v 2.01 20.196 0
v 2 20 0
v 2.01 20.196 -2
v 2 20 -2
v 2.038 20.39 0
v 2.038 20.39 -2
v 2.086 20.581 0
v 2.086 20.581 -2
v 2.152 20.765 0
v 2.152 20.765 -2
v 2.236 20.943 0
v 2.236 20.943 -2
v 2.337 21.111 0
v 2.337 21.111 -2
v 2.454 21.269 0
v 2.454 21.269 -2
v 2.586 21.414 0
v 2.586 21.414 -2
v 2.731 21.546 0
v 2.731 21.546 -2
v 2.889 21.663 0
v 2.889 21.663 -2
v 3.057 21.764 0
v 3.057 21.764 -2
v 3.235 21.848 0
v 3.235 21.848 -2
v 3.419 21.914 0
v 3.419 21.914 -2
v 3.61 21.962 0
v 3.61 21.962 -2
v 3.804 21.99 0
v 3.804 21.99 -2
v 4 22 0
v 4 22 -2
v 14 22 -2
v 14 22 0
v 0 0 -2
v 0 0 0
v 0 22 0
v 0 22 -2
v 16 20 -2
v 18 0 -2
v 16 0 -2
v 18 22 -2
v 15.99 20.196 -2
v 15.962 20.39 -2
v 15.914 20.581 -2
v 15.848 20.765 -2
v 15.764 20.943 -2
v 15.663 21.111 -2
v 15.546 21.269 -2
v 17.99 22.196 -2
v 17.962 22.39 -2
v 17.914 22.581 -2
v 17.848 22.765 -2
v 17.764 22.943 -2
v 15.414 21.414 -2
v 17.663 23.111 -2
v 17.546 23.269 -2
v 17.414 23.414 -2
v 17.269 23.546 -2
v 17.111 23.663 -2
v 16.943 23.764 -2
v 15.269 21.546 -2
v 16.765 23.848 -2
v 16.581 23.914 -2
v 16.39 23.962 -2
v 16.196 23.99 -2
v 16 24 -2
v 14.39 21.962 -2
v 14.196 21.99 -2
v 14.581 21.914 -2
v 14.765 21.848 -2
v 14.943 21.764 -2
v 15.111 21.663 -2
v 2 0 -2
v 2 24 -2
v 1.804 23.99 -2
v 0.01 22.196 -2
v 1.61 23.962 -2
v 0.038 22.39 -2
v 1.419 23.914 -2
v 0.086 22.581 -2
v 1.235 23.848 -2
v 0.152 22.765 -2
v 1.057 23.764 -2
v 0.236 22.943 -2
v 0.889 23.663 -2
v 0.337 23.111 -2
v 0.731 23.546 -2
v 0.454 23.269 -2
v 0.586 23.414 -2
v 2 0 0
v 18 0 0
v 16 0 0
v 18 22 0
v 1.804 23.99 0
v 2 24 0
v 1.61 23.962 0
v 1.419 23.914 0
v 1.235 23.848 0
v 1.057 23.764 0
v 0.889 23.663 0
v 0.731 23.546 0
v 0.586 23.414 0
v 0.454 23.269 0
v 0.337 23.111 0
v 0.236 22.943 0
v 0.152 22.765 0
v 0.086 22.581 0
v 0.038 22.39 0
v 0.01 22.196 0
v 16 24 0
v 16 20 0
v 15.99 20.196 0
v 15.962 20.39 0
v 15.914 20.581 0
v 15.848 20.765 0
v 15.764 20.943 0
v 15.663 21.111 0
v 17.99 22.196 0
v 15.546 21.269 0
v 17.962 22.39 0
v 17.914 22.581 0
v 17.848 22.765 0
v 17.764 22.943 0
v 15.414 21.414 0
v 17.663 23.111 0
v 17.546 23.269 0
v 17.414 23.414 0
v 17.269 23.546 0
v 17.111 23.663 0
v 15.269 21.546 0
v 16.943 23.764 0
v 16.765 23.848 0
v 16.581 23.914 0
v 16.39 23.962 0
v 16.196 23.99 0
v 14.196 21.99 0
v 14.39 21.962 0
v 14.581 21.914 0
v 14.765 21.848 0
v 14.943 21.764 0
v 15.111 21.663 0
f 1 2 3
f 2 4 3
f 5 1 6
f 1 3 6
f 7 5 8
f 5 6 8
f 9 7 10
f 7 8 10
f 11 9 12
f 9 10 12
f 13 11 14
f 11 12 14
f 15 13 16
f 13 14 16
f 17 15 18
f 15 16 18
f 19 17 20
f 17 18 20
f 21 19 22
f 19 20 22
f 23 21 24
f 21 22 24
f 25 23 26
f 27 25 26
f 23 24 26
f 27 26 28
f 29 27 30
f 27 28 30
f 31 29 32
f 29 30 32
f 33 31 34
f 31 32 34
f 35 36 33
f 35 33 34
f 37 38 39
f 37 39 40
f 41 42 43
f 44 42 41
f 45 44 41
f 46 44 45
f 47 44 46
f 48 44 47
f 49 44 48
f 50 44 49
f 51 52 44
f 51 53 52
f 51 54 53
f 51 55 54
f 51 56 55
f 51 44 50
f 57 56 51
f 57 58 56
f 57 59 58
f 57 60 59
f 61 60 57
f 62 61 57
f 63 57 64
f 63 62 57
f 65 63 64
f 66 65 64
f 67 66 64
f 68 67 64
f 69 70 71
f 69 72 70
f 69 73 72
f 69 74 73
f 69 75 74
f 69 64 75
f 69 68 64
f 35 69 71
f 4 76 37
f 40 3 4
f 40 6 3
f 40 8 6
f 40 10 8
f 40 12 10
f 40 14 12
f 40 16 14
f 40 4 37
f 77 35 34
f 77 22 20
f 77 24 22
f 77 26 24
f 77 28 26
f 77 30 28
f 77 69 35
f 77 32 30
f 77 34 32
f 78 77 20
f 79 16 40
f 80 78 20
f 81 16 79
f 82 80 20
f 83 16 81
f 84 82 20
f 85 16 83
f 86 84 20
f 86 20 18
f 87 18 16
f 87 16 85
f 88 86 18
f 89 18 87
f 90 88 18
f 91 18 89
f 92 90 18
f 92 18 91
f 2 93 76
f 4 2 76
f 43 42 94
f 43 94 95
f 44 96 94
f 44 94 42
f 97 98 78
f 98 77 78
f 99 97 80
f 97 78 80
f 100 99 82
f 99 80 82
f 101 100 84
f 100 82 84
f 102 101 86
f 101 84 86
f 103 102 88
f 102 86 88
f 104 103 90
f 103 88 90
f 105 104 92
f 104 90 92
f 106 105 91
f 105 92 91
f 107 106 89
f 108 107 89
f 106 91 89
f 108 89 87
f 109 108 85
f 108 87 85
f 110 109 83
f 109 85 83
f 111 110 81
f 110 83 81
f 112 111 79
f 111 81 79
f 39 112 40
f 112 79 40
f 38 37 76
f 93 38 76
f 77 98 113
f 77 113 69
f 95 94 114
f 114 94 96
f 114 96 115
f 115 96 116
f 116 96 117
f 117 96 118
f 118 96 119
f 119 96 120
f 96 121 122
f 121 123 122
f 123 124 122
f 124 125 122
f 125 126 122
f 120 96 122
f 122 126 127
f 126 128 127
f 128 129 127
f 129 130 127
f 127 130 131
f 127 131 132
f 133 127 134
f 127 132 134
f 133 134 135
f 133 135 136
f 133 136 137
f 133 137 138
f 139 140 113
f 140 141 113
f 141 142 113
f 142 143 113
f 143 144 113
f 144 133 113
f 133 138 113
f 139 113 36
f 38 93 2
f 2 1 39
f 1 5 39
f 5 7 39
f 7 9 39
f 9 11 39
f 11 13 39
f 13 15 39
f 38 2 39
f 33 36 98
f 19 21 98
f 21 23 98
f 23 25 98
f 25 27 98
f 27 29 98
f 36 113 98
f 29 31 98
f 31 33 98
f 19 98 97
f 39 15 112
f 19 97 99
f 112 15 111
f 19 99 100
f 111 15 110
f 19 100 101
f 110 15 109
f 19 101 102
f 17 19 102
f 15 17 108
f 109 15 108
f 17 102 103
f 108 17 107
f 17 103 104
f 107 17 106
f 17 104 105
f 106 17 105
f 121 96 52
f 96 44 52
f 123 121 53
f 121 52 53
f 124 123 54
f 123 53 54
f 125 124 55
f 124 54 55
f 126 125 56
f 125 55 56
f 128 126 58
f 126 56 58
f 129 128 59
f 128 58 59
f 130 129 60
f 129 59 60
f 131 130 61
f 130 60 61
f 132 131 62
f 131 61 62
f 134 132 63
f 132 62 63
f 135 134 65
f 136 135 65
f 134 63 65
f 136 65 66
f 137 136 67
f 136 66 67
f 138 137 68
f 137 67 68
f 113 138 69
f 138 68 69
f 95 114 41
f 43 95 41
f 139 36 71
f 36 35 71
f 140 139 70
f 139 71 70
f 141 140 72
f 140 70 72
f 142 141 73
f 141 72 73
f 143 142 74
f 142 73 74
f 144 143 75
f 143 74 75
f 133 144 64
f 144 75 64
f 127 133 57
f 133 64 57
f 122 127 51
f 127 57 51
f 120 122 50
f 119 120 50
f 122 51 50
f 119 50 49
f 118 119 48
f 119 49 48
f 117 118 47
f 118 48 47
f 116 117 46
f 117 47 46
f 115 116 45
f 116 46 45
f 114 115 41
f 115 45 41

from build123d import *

# Parameters (mm, degrees)
SKETCH1_W           = 2
SKETCH1_H           = 2
BOSS_EXTRUDE1_DEPTH = 24
SKETCH2_W           = 2
SKETCH2_H           = 2
BOSS_EXTRUDE2_DEPTH = 16
SKETCH3_W           = 2
SKETCH3_H           = 2
BOSS_EXTRUDE3_DEPTH = 22
FILLET1_R           = 2
FILLET2_R           = 2


with BuildPart() as part:
    # Sketch1 → Boss-Extrude1 (new body)
    with BuildSketch(Plane(origin=(0, 0, 0), x_dir=(1, 0, 0), z_dir=(0, 1, 0))):
        with Locations((1, 1)):
            Rectangle(SKETCH1_W, SKETCH1_H)
    extrude(amount=BOSS_EXTRUDE1_DEPTH)

    # Sketch2 → Boss-Extrude2 (add)
    with BuildSketch(Plane(origin=(2, 0, 0), x_dir=(0, 0, -1), z_dir=(1, 0, 0))):
        with Locations((1, 23)):
            Rectangle(SKETCH2_W, SKETCH2_H)
    extrude(amount=BOSS_EXTRUDE2_DEPTH)

    # Sketch3 → Boss-Extrude3 (add)
    with BuildSketch(Plane(origin=(0, 22, 0), x_dir=(-1, 0, 0), z_dir=(0, -1, 0))):
        with Locations((-17, 1)):
            Rectangle(SKETCH3_W, SKETCH3_H)
    extrude(amount=BOSS_EXTRUDE3_DEPTH)

    # Fillet1
    fillet1_edges = [part.edges().sort_by_distance(p)[0] for p in [
        (2, 22, -1),
        (16, 22, -1),
    ]]
    fillet(fillet1_edges, radius=FILLET1_R)

    # Fillet2
    fillet2_edges = [part.edges().sort_by_distance(p)[0] for p in [
        (18, 24, -1),
        (0, 24, -1),
    ]]
    fillet(fillet2_edges, radius=FILLET2_R)


solid = part.part
